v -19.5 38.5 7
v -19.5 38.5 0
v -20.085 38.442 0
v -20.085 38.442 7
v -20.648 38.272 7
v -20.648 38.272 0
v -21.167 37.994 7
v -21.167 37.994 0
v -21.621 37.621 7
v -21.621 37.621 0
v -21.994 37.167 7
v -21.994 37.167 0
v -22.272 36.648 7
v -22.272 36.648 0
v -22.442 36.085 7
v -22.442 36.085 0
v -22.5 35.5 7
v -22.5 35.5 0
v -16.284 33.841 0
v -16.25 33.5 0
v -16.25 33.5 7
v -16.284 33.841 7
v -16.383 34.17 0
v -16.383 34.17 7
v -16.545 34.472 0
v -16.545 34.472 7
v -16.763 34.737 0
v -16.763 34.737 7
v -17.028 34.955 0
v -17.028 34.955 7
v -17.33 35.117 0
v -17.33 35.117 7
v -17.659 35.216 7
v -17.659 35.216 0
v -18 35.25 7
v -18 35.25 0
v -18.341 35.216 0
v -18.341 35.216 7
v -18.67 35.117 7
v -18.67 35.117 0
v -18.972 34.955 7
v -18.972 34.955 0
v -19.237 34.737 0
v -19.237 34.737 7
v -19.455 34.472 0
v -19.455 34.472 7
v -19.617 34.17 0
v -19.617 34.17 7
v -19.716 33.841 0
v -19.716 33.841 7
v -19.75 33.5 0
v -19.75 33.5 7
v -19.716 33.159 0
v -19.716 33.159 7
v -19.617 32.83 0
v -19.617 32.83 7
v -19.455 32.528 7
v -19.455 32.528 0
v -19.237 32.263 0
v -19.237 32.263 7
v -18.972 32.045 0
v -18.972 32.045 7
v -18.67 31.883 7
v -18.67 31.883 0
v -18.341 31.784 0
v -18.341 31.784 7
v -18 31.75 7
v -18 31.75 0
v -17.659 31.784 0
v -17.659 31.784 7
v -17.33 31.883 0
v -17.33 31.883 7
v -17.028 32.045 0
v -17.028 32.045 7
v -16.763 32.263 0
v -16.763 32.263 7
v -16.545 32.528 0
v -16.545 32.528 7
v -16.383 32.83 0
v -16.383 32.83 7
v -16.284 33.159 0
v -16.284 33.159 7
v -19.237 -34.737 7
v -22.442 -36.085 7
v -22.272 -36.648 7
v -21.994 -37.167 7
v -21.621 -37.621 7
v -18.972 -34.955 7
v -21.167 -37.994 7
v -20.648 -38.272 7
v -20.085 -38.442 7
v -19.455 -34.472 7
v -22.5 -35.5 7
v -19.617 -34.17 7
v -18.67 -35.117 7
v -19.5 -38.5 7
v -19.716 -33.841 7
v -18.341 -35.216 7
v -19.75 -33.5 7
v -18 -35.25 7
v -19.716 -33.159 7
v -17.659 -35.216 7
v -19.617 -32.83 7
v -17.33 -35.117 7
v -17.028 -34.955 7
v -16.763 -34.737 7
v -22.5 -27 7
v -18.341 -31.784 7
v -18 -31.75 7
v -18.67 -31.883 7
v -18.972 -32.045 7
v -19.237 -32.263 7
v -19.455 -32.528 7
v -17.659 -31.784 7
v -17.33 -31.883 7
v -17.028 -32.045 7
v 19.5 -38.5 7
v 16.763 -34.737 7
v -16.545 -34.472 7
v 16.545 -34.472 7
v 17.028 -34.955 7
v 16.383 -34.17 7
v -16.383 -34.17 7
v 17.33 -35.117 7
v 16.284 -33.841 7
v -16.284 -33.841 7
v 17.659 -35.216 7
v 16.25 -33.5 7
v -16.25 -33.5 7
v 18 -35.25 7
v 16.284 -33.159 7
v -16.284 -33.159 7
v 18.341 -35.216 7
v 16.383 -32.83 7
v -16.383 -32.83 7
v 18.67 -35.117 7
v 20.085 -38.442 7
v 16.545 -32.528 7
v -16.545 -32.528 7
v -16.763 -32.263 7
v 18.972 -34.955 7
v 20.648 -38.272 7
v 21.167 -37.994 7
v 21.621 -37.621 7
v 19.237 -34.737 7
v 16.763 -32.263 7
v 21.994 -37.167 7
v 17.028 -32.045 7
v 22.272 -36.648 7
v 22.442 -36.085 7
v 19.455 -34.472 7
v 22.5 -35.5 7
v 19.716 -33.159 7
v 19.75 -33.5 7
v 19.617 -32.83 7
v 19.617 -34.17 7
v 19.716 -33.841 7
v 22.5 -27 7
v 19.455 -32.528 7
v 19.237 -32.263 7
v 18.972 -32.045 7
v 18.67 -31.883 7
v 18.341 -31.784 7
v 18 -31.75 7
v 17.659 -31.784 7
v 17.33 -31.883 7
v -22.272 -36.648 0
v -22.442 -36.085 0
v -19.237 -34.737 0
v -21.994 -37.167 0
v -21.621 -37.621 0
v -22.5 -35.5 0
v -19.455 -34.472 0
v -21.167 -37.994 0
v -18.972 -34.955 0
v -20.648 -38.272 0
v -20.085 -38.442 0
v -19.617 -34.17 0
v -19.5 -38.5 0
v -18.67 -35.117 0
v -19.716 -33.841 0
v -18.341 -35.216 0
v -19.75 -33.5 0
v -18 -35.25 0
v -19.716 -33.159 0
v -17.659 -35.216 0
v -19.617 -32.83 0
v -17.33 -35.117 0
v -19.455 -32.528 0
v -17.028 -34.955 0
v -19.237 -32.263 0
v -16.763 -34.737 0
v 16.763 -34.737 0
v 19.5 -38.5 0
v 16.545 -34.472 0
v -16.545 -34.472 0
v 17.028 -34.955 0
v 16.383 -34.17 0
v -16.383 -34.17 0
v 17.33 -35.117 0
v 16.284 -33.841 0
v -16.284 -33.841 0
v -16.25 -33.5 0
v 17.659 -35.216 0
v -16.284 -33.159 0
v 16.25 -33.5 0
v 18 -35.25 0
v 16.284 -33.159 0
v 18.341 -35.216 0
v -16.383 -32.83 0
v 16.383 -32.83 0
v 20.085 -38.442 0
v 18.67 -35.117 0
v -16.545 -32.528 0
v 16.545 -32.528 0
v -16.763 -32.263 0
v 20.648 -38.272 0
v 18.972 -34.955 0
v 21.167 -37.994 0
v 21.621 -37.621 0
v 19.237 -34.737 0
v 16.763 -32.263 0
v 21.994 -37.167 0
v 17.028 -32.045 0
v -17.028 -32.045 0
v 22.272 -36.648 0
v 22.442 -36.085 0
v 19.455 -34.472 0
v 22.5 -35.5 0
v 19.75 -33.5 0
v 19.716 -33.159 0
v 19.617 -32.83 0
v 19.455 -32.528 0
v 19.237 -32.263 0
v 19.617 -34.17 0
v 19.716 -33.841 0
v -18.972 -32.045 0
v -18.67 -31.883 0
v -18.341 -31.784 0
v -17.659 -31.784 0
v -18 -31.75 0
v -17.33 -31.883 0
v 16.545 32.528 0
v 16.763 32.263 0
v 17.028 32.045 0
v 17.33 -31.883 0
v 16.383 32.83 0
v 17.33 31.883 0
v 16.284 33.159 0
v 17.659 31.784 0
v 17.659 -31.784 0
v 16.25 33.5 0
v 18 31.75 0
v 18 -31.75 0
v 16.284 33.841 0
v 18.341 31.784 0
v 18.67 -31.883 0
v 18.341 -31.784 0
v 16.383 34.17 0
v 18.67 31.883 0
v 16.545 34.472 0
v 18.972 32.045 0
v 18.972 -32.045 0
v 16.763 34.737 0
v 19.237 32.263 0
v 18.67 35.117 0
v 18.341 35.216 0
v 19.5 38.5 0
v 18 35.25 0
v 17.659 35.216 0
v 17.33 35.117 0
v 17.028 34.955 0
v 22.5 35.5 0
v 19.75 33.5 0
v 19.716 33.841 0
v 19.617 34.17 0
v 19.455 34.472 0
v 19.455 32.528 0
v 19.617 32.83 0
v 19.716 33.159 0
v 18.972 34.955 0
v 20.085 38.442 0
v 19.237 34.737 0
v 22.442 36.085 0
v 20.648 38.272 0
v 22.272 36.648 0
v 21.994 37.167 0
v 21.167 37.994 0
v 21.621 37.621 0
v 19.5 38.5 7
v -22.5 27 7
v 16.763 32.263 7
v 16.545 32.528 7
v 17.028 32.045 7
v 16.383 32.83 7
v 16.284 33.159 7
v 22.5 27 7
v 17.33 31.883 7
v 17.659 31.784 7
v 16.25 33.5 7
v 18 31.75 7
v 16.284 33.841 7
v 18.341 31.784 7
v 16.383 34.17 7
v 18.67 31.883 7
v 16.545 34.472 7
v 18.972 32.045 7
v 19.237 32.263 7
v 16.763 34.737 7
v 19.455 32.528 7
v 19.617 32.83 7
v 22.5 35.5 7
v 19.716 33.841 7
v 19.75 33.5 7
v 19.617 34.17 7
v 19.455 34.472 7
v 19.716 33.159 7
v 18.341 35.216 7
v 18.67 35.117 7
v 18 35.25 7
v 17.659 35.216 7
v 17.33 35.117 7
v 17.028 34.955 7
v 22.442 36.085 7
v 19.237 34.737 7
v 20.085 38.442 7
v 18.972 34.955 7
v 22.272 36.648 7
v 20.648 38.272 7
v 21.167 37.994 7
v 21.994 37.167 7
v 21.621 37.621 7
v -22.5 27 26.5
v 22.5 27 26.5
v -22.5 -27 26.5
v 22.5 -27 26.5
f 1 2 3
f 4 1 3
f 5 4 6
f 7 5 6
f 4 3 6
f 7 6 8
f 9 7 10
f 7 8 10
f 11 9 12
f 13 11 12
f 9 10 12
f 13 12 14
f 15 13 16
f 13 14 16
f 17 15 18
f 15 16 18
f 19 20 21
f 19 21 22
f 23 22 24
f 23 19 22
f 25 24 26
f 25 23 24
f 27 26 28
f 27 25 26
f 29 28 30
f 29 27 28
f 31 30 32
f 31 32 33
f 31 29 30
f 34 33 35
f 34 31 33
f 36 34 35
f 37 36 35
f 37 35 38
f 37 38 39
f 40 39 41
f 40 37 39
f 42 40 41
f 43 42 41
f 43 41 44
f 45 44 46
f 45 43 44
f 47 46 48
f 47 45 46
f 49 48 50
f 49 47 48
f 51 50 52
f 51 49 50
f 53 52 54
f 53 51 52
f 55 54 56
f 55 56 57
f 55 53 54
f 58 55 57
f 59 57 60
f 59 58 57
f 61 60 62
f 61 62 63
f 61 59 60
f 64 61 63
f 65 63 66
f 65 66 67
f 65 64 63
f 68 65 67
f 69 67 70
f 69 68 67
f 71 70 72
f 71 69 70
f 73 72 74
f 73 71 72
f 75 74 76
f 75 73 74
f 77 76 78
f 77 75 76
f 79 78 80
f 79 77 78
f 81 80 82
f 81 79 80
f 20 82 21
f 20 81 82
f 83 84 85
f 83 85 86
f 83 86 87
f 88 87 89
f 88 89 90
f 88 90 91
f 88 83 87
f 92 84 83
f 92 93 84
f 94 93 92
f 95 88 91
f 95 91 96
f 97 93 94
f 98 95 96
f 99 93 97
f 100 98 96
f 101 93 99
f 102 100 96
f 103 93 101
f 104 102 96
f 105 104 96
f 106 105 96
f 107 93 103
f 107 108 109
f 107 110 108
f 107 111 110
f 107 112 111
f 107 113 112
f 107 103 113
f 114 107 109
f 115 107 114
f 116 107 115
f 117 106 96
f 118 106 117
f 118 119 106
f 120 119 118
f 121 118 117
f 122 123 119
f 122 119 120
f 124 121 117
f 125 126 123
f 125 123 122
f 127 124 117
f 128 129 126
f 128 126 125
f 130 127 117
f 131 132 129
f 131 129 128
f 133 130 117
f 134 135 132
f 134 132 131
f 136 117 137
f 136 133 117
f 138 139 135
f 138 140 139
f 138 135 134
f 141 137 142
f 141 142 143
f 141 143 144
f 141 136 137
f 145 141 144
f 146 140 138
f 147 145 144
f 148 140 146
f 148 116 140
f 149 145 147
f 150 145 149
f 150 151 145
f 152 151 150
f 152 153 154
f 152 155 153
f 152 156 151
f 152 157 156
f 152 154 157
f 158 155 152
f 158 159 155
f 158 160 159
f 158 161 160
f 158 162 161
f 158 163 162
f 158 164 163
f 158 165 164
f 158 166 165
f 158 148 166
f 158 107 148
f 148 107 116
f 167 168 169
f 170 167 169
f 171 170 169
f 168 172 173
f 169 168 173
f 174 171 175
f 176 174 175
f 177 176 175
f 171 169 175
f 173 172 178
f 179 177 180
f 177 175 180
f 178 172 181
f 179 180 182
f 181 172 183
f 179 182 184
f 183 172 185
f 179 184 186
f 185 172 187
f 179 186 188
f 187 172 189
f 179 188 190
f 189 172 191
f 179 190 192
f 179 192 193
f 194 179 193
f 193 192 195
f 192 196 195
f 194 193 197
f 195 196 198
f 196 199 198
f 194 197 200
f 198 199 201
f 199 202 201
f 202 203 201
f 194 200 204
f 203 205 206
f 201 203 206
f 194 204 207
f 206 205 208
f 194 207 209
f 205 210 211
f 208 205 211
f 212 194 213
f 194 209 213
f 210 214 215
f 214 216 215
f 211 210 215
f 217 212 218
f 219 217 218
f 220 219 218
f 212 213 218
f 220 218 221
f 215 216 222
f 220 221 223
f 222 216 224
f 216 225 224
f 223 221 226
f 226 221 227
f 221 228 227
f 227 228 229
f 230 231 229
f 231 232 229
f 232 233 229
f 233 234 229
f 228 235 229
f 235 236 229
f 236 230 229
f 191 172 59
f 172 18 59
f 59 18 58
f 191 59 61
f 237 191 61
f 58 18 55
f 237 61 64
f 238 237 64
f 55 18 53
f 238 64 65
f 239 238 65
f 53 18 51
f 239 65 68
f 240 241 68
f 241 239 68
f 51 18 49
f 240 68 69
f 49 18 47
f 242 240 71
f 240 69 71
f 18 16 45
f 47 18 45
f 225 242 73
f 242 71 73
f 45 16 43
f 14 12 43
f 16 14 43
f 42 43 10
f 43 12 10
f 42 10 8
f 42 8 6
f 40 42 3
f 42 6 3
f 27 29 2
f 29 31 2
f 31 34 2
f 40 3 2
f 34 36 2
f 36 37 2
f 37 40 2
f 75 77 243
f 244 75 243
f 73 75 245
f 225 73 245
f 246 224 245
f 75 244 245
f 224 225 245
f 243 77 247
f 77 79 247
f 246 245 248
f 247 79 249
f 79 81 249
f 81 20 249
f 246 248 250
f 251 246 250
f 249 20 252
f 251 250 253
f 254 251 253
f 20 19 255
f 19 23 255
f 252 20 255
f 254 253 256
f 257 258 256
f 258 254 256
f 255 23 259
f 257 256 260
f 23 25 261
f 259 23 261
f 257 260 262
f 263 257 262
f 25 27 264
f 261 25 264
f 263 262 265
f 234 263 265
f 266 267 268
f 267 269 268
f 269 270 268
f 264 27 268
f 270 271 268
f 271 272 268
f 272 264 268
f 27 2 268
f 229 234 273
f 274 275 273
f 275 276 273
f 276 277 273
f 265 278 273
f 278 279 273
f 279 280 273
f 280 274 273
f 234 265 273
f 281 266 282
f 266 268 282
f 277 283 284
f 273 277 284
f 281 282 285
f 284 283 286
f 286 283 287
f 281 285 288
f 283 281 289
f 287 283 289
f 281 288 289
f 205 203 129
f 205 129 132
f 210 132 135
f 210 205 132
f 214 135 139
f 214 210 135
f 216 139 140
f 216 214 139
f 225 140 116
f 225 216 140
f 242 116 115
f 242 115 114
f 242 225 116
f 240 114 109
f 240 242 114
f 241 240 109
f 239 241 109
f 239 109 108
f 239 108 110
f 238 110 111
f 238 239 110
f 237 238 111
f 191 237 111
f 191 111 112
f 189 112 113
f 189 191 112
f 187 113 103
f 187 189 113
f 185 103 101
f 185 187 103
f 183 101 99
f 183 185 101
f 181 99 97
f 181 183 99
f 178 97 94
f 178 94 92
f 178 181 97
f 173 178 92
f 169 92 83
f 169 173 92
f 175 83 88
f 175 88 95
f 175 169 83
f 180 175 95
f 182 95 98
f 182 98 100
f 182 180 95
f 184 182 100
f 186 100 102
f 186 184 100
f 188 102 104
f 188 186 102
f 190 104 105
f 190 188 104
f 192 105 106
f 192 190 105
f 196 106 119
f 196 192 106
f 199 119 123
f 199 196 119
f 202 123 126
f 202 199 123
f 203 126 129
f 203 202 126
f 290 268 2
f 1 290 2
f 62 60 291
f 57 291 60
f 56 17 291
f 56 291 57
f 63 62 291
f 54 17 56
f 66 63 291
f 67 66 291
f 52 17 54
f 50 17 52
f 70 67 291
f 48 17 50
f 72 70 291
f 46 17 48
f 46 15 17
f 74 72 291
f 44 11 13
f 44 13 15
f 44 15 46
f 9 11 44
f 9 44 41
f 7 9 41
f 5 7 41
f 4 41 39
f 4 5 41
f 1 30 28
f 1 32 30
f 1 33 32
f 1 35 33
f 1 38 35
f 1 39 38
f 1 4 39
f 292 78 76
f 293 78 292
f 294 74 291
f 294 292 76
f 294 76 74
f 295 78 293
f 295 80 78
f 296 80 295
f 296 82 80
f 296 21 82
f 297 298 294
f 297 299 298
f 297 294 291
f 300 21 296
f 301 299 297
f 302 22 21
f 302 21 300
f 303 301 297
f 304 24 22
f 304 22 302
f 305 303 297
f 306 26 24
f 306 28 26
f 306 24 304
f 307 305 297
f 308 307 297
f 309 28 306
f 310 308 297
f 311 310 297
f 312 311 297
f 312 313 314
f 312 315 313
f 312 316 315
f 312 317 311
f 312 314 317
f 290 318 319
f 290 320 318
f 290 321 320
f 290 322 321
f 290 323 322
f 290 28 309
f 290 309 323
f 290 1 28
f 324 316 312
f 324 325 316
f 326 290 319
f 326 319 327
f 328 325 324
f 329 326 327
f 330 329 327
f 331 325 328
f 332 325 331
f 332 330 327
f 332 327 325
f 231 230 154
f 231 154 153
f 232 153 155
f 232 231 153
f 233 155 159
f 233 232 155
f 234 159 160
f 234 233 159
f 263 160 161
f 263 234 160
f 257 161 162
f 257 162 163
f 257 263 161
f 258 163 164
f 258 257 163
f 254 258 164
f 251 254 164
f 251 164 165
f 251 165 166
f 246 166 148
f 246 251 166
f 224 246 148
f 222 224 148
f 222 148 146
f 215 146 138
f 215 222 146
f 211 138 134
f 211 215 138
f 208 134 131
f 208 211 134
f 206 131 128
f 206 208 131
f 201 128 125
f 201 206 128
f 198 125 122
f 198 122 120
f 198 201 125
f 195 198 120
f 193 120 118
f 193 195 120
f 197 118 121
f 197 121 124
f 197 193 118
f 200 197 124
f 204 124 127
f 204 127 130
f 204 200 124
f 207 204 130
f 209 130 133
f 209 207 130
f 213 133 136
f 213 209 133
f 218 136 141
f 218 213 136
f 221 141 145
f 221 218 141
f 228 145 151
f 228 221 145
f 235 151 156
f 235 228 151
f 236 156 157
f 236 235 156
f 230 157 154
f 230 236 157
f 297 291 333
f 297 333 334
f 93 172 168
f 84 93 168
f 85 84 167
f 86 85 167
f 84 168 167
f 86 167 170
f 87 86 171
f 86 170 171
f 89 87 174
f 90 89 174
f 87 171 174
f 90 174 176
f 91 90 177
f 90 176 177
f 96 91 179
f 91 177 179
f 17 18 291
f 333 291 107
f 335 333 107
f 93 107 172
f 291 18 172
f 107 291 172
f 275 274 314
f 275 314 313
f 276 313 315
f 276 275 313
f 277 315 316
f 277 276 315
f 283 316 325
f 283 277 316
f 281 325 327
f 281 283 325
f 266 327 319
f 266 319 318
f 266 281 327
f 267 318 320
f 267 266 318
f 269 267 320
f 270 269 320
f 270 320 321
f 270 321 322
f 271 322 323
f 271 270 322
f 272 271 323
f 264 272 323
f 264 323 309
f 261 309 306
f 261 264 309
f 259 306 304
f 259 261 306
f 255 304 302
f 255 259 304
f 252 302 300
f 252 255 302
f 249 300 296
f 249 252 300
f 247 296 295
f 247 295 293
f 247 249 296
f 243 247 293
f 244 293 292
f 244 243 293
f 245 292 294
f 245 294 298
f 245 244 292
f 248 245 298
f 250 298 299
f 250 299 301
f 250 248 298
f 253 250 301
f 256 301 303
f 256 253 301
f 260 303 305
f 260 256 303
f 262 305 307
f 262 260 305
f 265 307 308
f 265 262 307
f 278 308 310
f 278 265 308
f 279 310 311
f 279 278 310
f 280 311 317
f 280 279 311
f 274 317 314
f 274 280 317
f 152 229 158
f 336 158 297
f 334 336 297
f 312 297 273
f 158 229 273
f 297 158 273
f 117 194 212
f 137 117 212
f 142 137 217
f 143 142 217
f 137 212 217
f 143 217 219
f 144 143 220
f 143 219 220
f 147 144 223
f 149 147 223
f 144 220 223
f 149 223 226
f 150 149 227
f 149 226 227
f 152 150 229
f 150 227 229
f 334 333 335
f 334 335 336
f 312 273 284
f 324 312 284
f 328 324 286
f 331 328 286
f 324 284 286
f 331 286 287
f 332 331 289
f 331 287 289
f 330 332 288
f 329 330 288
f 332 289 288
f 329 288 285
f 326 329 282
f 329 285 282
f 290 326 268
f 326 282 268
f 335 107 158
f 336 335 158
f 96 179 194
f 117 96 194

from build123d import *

# Parameters (mm, degrees)
F0_R     = 1.75
F1_DEPTH = 7
F2_W     = 45
F2_H     = 54
F3_DEPTH = 19.5


with BuildPart() as f1:
    # F0 (on Top) → F1 (new body)
    with BuildSketch(Plane.XY):
        with BuildLine():
            ThreePointArc((19.5, -38.5), (21.62132, -37.62132), (22.5, -35.5))
            Line((22.5, -35.5), (22.5, 0))
            Line((22.5, 0), (22.5, 35.5))
            ThreePointArc((22.5, 35.5), (21.62132, 37.62132), (19.5, 38.5))
            Line((19.5, 38.5), (0, 38.5))
            Line((0, 38.5), (-19.5, 38.5))
            ThreePointArc((-19.5, 38.5), (-21.62132, 37.62132), (-22.5, 35.5))
            Line((-22.5, 35.5), (-22.5, 0))
            Line((-22.5, 0), (-22.5, -35.5))
            ThreePointArc((-22.5, -35.5), (-21.62132, -37.62132), (-19.5, -38.5))
            Line((-19.5, -38.5), (0, -38.5))
            Line((0, -38.5), (19.5, -38.5))
        make_face()
        with Locations((-18, -33.5)):
            Circle(F0_R, mode=Mode.SUBTRACT)
        with Locations((18, -33.5)):
            Circle(F0_R, mode=Mode.SUBTRACT)
        with Locations((-18, 33.5)):
            Circle(F0_R, mode=Mode.SUBTRACT)
        with Locations((18, 33.5)):
            Circle(F0_R, mode=Mode.SUBTRACT)
    extrude(amount=F1_DEPTH)

    # F2 (on face) → F3 (join)
    with BuildSketch(Plane.XY.offset(7)):
        Rectangle(F2_W, F2_H)
    extrude(amount=F3_DEPTH)


solid = f1.part
